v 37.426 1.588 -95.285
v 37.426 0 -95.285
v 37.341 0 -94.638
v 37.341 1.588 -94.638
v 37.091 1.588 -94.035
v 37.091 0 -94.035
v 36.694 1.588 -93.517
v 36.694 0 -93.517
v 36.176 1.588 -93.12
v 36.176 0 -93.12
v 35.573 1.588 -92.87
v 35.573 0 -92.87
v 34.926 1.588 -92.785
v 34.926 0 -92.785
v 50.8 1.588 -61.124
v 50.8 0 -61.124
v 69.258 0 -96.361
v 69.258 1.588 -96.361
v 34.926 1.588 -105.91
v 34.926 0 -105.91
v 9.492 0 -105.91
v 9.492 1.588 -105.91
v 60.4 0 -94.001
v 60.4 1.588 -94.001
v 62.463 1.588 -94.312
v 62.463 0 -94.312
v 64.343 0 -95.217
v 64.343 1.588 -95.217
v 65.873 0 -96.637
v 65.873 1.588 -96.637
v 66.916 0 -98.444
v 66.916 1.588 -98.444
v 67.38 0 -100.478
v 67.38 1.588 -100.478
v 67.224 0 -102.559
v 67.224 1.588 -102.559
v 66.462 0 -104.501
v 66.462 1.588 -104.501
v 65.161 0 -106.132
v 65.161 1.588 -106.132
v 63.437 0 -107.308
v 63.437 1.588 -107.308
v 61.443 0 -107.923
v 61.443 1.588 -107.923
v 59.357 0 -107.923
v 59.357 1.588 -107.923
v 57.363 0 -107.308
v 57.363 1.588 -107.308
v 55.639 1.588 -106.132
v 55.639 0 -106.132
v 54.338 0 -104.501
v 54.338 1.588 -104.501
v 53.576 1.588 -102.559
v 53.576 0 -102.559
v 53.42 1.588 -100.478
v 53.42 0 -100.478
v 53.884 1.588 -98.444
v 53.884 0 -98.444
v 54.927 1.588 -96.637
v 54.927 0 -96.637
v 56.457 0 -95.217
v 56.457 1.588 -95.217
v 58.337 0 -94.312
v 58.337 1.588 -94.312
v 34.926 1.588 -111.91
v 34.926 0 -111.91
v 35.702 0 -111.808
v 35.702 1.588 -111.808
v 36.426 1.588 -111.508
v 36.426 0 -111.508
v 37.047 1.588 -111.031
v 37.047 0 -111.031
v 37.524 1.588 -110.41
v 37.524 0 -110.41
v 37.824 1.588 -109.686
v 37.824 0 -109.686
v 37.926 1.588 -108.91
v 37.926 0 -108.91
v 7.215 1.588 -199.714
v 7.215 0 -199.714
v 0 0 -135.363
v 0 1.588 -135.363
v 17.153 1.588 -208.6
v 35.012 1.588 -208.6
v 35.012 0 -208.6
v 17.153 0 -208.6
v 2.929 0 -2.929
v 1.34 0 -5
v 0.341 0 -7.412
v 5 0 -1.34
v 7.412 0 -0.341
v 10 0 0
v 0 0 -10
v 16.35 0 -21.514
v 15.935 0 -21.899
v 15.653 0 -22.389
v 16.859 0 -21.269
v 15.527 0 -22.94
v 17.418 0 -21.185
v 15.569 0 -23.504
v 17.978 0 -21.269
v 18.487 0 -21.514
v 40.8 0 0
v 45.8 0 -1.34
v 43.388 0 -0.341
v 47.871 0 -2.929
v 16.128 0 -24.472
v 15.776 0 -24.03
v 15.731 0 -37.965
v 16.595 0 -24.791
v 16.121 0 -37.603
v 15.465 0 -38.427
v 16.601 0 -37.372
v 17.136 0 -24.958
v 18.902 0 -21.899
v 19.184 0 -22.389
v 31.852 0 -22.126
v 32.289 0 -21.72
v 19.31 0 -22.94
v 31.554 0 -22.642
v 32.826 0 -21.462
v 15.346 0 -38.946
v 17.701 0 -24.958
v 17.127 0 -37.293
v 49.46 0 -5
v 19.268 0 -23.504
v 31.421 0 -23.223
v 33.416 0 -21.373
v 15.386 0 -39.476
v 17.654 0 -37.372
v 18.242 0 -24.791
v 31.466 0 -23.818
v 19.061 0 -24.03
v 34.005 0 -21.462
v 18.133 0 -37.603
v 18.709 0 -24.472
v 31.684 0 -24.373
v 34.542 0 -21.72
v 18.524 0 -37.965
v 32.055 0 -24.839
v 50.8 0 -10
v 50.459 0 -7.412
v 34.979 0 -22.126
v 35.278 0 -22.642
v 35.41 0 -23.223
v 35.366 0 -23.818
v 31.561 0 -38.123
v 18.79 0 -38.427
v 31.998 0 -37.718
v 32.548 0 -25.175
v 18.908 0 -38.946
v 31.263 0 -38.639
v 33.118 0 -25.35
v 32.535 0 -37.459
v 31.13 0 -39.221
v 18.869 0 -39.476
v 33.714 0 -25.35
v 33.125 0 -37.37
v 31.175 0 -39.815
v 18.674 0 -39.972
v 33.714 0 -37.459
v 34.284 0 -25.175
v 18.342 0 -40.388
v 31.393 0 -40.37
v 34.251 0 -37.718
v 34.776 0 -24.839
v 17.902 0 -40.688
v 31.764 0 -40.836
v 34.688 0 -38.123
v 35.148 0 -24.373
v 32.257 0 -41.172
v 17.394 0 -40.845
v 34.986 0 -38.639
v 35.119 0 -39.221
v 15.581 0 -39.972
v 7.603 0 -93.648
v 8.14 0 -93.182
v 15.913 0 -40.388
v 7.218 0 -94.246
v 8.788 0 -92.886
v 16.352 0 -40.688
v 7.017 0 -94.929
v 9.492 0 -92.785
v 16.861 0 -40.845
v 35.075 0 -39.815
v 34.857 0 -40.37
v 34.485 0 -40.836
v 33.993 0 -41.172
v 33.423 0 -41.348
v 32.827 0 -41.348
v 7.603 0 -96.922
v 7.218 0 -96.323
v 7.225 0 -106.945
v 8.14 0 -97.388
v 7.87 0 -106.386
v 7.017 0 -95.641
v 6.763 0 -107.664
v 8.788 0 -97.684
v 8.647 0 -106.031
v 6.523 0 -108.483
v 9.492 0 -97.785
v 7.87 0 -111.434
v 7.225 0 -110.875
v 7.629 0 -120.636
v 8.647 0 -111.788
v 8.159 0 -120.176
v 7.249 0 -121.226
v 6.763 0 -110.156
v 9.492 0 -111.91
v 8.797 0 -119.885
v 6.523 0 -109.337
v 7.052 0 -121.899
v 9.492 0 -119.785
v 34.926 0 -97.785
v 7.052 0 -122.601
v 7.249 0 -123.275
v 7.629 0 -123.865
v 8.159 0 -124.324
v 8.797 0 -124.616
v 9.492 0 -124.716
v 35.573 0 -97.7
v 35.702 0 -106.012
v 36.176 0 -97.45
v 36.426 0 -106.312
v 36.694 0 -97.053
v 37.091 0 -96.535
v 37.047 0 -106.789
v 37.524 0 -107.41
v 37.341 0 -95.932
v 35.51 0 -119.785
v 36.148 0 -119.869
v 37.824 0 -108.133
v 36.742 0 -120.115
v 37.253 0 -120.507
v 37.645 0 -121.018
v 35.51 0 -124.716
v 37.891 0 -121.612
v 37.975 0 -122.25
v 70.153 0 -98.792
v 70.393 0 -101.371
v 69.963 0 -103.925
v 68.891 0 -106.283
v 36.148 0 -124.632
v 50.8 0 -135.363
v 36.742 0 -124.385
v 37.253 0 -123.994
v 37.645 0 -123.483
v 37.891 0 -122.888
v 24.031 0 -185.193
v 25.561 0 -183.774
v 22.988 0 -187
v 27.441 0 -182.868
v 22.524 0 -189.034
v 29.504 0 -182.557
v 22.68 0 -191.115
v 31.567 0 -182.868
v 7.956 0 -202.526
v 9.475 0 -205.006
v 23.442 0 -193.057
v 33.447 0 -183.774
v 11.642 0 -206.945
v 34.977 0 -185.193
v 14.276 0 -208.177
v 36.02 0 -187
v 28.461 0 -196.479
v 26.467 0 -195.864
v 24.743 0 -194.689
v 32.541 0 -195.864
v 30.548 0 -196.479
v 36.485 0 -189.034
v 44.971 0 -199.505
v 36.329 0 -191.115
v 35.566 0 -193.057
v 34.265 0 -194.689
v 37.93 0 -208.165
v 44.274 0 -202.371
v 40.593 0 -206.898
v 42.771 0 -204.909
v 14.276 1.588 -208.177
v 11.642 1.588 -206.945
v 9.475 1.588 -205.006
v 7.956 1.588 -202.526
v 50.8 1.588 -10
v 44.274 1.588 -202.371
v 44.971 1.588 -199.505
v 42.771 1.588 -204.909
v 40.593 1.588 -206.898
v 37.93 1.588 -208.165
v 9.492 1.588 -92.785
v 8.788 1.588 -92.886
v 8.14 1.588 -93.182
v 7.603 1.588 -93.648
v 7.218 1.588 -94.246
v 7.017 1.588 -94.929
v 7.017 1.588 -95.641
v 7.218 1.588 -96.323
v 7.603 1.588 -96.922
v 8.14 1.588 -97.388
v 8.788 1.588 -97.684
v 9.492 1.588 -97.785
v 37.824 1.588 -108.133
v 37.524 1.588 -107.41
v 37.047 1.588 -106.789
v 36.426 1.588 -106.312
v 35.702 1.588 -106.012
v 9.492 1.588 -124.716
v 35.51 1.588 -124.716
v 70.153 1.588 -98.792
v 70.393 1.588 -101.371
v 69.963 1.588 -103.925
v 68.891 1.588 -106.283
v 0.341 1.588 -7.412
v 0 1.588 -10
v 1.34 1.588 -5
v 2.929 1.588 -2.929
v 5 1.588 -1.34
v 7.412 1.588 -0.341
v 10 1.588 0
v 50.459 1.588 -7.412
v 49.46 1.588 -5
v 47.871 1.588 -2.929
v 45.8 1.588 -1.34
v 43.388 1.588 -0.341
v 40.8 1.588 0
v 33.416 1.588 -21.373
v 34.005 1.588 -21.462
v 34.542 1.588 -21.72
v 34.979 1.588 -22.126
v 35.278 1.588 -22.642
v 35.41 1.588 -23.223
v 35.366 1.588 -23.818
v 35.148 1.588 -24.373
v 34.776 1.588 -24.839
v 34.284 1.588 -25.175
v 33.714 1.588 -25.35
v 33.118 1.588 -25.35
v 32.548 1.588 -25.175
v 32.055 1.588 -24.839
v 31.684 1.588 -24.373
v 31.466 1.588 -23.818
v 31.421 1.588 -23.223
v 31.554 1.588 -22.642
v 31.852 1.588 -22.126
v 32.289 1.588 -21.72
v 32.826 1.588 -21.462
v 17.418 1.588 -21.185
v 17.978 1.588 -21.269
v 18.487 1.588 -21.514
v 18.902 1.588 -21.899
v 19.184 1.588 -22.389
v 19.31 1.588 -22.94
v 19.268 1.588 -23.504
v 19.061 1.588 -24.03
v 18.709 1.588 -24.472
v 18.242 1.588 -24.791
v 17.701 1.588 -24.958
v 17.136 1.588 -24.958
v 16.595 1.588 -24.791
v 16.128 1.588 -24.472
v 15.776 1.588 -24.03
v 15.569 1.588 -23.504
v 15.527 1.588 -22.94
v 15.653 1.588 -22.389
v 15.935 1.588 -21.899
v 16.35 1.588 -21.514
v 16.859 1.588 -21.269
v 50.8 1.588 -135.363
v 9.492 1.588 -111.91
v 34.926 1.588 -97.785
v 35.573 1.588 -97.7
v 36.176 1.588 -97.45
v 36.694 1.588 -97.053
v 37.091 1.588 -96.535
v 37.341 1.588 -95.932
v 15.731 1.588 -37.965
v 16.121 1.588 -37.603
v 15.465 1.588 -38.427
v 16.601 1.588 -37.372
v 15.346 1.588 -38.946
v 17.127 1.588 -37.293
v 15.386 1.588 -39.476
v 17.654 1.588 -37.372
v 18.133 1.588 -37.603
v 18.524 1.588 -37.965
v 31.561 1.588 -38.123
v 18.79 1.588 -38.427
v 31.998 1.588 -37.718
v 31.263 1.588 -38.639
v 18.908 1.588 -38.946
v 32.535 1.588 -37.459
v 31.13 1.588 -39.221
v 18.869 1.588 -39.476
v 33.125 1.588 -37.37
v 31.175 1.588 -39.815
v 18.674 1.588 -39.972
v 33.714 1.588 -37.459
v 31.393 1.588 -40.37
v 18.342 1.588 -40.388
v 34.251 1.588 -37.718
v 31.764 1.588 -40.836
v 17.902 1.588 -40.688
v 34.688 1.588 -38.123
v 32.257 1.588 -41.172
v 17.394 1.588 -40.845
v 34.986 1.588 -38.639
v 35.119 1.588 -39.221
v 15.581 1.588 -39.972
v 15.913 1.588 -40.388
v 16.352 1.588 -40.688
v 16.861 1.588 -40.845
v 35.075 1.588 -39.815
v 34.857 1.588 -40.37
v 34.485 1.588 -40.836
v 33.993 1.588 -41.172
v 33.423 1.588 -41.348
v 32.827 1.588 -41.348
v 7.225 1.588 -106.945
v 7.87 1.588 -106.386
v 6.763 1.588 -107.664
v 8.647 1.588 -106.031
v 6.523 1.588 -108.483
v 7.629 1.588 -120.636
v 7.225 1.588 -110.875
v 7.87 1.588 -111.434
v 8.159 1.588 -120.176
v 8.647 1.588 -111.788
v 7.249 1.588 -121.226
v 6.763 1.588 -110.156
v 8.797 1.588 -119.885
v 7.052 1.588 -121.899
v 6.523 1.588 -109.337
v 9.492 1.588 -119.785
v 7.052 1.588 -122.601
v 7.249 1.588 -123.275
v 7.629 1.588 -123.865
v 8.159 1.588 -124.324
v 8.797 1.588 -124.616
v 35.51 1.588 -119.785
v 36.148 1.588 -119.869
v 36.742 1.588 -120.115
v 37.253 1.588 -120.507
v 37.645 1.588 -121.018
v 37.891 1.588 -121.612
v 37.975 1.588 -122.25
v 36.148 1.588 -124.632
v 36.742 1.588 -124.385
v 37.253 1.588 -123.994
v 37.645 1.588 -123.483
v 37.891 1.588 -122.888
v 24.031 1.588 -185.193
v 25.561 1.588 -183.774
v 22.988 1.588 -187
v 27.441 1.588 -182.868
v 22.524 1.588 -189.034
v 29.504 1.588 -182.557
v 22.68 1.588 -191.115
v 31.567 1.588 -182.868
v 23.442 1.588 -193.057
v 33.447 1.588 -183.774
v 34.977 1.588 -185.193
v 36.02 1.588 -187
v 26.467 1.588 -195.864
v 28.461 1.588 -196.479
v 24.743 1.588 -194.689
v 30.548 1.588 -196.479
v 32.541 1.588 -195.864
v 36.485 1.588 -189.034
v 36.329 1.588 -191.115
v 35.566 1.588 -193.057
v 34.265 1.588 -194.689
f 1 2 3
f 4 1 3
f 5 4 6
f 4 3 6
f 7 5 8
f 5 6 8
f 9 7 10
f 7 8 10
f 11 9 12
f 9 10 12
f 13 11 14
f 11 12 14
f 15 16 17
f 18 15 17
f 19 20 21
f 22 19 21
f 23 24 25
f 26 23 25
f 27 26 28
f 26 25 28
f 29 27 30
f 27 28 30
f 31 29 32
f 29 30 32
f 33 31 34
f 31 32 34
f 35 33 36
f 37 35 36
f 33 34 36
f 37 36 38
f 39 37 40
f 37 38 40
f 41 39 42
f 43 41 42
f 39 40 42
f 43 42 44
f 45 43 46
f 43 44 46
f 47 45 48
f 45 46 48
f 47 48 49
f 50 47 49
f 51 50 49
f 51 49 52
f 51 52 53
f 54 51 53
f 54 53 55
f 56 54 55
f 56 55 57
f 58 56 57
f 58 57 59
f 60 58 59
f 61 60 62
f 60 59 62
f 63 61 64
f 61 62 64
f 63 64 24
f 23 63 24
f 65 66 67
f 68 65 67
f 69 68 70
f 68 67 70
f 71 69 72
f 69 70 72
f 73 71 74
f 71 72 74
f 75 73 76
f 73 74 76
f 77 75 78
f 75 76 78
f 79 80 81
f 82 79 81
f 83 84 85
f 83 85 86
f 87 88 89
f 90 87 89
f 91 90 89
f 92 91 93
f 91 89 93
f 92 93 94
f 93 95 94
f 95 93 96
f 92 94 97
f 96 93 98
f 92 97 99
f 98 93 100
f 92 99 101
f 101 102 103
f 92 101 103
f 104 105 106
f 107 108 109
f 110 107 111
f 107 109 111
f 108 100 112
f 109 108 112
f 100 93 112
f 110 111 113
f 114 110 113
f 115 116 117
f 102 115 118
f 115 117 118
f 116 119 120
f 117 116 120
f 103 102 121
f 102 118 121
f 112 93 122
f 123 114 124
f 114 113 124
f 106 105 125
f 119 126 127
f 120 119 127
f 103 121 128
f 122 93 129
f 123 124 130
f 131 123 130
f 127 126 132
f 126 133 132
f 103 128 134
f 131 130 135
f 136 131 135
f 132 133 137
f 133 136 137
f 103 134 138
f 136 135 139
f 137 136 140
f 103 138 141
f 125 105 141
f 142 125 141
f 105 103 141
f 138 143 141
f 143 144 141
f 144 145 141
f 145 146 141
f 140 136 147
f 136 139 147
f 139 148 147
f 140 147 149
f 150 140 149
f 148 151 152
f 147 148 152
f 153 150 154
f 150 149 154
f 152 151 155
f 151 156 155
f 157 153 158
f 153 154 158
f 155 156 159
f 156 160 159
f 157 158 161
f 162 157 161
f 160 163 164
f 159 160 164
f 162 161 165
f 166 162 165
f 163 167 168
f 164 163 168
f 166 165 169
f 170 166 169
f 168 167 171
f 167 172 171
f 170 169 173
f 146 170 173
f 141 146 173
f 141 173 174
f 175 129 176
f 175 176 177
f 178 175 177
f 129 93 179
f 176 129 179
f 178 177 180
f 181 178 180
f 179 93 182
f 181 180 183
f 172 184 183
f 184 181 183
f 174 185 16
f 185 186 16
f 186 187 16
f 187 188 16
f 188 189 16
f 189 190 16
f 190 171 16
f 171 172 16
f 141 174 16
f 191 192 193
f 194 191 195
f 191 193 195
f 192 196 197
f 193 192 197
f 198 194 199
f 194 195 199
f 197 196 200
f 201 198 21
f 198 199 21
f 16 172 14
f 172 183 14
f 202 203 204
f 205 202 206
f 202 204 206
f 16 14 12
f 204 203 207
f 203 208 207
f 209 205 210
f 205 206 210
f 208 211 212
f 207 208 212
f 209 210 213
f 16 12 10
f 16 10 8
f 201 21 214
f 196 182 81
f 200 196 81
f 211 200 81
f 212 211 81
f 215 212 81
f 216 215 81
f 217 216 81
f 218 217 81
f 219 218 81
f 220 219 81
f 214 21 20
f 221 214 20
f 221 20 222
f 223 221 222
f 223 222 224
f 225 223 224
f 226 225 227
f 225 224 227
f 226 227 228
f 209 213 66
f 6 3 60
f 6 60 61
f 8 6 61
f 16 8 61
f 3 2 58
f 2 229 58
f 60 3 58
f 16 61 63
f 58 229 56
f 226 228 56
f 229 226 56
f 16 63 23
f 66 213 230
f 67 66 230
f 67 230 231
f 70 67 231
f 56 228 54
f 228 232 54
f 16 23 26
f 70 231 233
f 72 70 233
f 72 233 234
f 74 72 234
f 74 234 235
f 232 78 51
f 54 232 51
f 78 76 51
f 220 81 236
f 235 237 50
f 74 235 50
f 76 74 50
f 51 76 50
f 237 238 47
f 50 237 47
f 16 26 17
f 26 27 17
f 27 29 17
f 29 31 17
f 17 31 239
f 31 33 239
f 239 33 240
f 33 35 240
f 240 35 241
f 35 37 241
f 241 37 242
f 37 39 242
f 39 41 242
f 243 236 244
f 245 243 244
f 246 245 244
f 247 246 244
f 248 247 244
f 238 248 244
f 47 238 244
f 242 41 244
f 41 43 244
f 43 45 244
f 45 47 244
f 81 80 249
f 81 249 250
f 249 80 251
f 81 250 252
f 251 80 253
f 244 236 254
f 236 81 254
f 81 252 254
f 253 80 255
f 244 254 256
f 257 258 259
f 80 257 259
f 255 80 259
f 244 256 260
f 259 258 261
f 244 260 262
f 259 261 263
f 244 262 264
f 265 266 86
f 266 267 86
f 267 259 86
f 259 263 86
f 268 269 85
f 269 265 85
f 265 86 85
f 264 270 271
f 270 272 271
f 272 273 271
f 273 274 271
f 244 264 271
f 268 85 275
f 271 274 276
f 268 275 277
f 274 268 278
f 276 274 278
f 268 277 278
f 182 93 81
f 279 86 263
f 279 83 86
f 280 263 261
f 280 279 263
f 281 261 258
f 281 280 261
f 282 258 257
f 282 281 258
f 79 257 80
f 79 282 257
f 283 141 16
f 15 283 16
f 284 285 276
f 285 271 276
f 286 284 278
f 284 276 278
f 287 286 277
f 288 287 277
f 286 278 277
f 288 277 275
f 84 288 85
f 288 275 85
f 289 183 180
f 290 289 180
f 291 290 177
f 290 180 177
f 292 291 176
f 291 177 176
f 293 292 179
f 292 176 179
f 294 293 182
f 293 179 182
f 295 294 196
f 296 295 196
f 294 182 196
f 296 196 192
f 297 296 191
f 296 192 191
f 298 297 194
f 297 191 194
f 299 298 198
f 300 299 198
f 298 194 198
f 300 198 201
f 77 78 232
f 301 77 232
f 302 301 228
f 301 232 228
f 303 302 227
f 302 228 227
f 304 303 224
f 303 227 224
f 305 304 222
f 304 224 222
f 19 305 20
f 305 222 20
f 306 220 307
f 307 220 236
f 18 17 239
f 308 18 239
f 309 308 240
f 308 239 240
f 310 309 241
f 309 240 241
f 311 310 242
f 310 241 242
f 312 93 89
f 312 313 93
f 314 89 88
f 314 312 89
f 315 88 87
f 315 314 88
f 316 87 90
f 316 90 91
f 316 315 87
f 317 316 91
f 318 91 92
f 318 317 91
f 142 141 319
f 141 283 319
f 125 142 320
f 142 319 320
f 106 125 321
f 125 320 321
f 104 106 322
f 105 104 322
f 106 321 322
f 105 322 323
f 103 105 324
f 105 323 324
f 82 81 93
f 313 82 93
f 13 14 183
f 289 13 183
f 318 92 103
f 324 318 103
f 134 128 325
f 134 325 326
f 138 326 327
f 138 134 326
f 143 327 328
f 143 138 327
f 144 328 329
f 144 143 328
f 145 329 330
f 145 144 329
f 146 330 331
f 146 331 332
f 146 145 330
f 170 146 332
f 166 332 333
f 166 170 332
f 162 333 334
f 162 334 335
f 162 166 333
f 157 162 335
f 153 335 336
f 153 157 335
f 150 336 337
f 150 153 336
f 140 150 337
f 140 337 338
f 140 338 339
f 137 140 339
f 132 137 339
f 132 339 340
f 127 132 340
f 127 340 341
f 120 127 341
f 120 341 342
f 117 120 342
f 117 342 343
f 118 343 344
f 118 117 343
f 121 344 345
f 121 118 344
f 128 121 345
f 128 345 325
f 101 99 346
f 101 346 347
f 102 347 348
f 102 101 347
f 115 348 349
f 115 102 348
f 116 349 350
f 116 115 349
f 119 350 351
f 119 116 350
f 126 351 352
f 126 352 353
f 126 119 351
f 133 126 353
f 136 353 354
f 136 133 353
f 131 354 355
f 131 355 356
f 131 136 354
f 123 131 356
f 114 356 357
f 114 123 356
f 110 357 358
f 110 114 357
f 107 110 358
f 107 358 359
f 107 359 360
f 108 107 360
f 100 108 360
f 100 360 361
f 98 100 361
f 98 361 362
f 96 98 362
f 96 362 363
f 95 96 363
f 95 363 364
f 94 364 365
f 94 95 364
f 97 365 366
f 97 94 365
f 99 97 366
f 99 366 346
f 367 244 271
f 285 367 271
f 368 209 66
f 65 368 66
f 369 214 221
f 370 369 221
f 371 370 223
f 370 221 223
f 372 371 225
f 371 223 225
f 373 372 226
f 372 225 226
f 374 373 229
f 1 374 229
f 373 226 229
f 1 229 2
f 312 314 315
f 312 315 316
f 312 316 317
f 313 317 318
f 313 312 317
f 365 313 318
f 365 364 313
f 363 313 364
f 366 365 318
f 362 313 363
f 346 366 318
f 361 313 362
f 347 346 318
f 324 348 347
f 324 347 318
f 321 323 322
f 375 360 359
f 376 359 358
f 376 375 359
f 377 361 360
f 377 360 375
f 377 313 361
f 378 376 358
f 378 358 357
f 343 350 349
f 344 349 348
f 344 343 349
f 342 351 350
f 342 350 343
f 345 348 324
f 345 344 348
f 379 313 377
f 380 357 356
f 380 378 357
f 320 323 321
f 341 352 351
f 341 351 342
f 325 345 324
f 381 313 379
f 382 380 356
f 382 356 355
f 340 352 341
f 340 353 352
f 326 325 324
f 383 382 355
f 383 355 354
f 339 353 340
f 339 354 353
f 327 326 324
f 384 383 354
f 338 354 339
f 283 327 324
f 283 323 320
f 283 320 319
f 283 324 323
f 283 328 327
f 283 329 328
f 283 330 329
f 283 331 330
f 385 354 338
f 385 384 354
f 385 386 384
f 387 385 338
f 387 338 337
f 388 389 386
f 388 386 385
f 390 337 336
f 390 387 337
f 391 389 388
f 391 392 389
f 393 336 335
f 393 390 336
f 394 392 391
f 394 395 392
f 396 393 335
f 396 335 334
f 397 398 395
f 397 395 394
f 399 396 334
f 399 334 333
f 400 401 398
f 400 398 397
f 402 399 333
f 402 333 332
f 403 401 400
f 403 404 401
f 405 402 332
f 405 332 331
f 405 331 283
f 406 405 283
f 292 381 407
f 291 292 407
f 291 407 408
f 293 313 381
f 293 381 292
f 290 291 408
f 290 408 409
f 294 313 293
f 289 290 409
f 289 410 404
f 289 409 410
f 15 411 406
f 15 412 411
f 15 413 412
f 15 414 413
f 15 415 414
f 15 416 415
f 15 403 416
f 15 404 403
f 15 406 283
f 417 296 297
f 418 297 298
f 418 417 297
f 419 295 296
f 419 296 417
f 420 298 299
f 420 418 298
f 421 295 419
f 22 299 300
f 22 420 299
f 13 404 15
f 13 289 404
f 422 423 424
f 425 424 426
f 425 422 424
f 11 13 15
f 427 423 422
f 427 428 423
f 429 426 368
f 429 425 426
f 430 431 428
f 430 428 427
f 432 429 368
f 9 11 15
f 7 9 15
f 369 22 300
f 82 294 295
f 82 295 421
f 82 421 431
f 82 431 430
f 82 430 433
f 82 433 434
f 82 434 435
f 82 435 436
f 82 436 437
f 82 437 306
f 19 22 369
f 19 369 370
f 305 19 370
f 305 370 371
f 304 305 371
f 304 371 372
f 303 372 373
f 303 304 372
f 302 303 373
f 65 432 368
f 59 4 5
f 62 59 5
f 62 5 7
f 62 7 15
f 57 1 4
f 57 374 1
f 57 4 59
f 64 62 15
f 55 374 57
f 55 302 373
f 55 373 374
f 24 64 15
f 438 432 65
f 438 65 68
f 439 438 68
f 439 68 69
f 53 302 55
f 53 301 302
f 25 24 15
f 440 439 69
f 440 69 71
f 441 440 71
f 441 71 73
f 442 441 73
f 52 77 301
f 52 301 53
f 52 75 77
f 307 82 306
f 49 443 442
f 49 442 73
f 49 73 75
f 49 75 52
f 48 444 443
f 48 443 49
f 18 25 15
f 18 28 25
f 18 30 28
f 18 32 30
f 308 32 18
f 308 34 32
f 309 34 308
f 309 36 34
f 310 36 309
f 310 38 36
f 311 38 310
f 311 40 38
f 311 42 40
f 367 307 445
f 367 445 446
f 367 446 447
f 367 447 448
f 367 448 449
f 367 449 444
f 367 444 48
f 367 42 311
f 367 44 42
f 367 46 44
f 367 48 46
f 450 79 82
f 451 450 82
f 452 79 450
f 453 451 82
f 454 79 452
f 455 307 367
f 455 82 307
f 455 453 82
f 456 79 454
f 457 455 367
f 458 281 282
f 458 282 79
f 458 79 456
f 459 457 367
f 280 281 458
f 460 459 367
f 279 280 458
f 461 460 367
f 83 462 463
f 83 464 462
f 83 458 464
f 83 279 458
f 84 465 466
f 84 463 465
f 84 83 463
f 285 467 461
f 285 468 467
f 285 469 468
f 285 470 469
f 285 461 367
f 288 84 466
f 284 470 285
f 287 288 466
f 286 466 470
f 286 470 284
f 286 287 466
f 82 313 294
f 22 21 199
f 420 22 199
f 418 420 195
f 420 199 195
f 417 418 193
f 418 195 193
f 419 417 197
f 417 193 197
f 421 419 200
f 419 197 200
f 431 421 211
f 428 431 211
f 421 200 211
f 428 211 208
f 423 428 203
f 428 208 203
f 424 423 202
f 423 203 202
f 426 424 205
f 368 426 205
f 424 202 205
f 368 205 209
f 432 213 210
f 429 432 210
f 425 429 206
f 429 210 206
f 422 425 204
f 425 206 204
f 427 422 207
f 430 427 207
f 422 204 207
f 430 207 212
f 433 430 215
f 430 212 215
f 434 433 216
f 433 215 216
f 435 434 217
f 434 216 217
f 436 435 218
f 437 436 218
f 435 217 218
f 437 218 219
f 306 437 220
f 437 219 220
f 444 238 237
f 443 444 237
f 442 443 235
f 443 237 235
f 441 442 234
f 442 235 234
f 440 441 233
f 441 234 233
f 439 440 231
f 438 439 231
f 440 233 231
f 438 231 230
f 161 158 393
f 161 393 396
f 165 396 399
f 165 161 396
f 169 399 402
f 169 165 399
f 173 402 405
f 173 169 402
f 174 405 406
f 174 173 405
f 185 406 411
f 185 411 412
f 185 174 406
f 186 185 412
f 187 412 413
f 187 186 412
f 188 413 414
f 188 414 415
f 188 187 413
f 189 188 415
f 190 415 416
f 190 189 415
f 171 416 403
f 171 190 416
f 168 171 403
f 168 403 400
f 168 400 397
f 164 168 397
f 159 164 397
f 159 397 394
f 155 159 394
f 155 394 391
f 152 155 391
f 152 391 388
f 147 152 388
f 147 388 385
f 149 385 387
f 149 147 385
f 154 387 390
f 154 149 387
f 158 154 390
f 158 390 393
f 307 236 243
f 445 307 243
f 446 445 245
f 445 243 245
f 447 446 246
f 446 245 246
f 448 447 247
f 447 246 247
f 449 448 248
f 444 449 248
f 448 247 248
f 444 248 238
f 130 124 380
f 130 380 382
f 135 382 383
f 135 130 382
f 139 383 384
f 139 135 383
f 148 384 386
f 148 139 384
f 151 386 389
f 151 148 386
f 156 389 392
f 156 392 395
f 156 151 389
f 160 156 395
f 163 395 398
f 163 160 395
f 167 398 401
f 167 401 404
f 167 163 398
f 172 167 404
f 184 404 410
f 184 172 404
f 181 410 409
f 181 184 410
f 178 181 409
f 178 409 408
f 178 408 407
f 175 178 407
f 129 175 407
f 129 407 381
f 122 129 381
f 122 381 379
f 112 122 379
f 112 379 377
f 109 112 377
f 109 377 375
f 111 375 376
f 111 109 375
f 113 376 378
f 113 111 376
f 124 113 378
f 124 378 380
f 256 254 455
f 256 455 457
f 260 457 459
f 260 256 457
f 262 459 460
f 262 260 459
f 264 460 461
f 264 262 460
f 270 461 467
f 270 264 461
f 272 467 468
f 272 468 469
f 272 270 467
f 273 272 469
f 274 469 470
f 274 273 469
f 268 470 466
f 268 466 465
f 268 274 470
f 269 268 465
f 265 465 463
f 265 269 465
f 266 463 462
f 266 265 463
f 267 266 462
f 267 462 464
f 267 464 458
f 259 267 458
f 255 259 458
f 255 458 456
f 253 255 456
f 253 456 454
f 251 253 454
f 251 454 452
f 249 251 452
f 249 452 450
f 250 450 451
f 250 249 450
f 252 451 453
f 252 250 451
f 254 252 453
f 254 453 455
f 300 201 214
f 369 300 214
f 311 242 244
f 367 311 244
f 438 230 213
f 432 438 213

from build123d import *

# Parameters (mm, degrees)
SKETCH1_R           = 1.896979128
SKETCH1_R_2         = 1.786033574
SKETCH1_R_3         = 2
SKETCH1_R_4         = 7
BOSS_EXTRUDE1_DEPTH = 1.5875
SKETCH4_W           = 66.272407177
SKETCH4_H           = 27.800260981
CUT_EXTRUDE2_DEPTH  = 20
FILLET3_R           = 10
FILLET4_R           = 10
BOSS_EXTRUDE3_START = -1.5875
BOSS_EXTRUDE3_DEPTH = 1.5875
SKETCH7_R           = 7
CUT_EXTRUDE3_DEPTH  = 1.5875


with BuildPart() as part:
    # Sketch1 → Boss-Extrude1 (new body)
    with BuildSketch(Plane(origin=(0, 0, 0), x_dir=(1, 0, 0), z_dir=(0, 1, 0))):
        with BuildLine():
            Line((42.32729629, 228.6), (10.454309325, 228.6))
            Line((10.454309325, 228.6), (0, 135.362739137))
            Line((0, 135.362739137), (0, 0))
            Line((0, 0), (24.327009544, 0))
            Line((24.327009544, 0), (50.8, 0))
            Line((50.8, 0), (50.8, 64.87909603))
            Line((50.8, 64.87909603), (50.8, 87.423477361))
            Line((50.8, 87.423477361), (50.8, 98.200996728))
            ThreePointArc((50.8, 98.200996728), (50.4, 101.000996728), (50.8, 103.800996728))
            Line((50.8, 103.800996728), (50.8, 104.488200565))
            Line((50.8, 104.488200565), (50.8, 120.619222808))
            Line((50.8, 120.619222808), (50.8, 135.362739137))
            Line((50.8, 135.362739137), (42.32729629, 228.6))
        make_face()
        with Locations(Location((17.418441927, 23.081717093, 0), (0, 0, 270))):
            Circle(SKETCH1_R, mode=Mode.SUBTRACT)
        with Locations(Location((17.127384385, 39.079069546, 0), (0, 0, 270))):
            Circle(SKETCH1_R_2, mode=Mode.SUBTRACT)
        with Locations(Location((33.41579438, 23.372774635, 0), (0, 0, 270))):
            Circle(SKETCH1_R_3, mode=Mode.SUBTRACT)
        with Locations(Location((33.124736838, 39.370127088, 0), (0, 0, 270))):
            Circle(SKETCH1_R_3, mode=Mode.SUBTRACT)
        with BuildLine():
            Line((34.925740903, 92.78493524), (9.492033273, 92.78493524))
            ThreePointArc((9.492033273, 92.78493524), (6.992033273, 95.28493524), (9.492033273, 97.78493524))
            Line((9.492033273, 97.78493524), (34.925740903, 97.78493524))
            ThreePointArc((34.925740903, 97.78493524), (36.693507856, 97.052702193), (37.425740903, 95.28493524))
            ThreePointArc((37.425740903, 95.28493524), (36.693507856, 93.517168287), (34.925740903, 92.78493524))
        make_face(mode=Mode.SUBTRACT)
        with BuildLine():
            Line((34.925740903, 105.90993524), (9.492033273, 105.90993524))
            ThreePointArc((9.492033273, 105.90993524), (6.492033273, 108.90993524), (9.492033273, 111.90993524))
            Line((9.492033273, 111.90993524), (34.925740903, 111.90993524))
            ThreePointArc((34.925740903, 111.90993524), (37.047061246, 111.031255584), (37.925740903, 108.90993524))
            ThreePointArc((37.925740903, 108.90993524), (37.047061246, 106.788614896), (34.925740903, 105.90993524))
        make_face(mode=Mode.SUBTRACT)
        with BuildLine():
            Line((35.509675341, 119.784935244), (9.492033273, 119.784935244))
            ThreePointArc((9.492033273, 119.784935244), (7.026609419, 122.250359097), (9.492033273, 124.71578295))
            Line((9.492033273, 124.71578295), (35.509675341, 124.71578295))
            ThreePointArc((35.509675341, 124.71578295), (37.252993266, 123.993677022), (37.975099194, 122.250359097))
            ThreePointArc((37.975099194, 122.250359097), (37.252993266, 120.507041172), (35.509675341, 119.784935244))
        make_face(mode=Mode.SUBTRACT)
        with Locations(Location((29.504213454, 189.557234372, 0), (0, 0, 270))):
            Circle(SKETCH1_R_4, mode=Mode.SUBTRACT)
    extrude(amount=BOSS_EXTRUDE1_DEPTH)

    # Sketch4 → Cut-Extrude2 (cut)
    with BuildSketch(Plane(origin=(0, 0, -228.6), x_dir=(-1, 0, 0), z_dir=(0, 0, -1))):
        with Locations((-28.174690156, -1.980940155)):
            Rectangle(SKETCH4_W, SKETCH4_H)
    extrude(amount=-CUT_EXTRUDE2_DEPTH, mode=Mode.SUBTRACT)

    # Fillet3
    fillet3_edges = [part.edges().sort_by_distance(p)[0] for p in [
        (44.144746445, 0.79375, -208.6),
    ]]
    fillet(fillet3_edges, radius=FILLET3_R)

    # Fillet4
    fillet4_edges = [part.edges().sort_by_distance(p)[0] for p in [
        (50.8, 0.79375, 0),
        (0, 0.79375, 0),
        (8.211791854, 0.79375, -208.6),
    ]]
    fillet(fillet4_edges, radius=FILLET4_R)

    # Sketch6 → Boss-Extrude3 (add)
    with BuildSketch(Plane(origin=(0, 1.5875, 0), x_dir=(1, 0, 0), z_dir=(0, 1, 0)).offset(BOSS_EXTRUDE3_START)):
        with BuildLine():
            Line((50.8, 135.362739137), (50.8, 103.800996728))
            ThreePointArc((50.8, 103.800996728), (50.4, 101.000996728), (50.8, 98.200996728))
            Line((50.8, 98.200996728), (50.8, 61.124243317))
            Line((50.8, 61.124243317), (69.258211507, 96.360728536))
            ThreePointArc((69.258211507, 96.360728536), (70.393157133, 101.370875786), (68.890940865, 106.283413148))
            Line((68.890940865, 106.283413148), (50.8, 135.362739137))
        make_face()
    extrude(amount=BOSS_EXTRUDE3_DEPTH)

    # Sketch7 → Cut-Extrude3 (cut)
    with BuildSketch(Plane(origin=(0, 1.5875, 0), x_dir=(1, 0, 0), z_dir=(0, 1, 0))):
        with Locations(Location((60.4, 101.000996728, 0), (0, 0, 270))):
            Circle(SKETCH7_R)
    extrude(amount=-CUT_EXTRUDE3_DEPTH, mode=Mode.SUBTRACT)


solid = part.part
